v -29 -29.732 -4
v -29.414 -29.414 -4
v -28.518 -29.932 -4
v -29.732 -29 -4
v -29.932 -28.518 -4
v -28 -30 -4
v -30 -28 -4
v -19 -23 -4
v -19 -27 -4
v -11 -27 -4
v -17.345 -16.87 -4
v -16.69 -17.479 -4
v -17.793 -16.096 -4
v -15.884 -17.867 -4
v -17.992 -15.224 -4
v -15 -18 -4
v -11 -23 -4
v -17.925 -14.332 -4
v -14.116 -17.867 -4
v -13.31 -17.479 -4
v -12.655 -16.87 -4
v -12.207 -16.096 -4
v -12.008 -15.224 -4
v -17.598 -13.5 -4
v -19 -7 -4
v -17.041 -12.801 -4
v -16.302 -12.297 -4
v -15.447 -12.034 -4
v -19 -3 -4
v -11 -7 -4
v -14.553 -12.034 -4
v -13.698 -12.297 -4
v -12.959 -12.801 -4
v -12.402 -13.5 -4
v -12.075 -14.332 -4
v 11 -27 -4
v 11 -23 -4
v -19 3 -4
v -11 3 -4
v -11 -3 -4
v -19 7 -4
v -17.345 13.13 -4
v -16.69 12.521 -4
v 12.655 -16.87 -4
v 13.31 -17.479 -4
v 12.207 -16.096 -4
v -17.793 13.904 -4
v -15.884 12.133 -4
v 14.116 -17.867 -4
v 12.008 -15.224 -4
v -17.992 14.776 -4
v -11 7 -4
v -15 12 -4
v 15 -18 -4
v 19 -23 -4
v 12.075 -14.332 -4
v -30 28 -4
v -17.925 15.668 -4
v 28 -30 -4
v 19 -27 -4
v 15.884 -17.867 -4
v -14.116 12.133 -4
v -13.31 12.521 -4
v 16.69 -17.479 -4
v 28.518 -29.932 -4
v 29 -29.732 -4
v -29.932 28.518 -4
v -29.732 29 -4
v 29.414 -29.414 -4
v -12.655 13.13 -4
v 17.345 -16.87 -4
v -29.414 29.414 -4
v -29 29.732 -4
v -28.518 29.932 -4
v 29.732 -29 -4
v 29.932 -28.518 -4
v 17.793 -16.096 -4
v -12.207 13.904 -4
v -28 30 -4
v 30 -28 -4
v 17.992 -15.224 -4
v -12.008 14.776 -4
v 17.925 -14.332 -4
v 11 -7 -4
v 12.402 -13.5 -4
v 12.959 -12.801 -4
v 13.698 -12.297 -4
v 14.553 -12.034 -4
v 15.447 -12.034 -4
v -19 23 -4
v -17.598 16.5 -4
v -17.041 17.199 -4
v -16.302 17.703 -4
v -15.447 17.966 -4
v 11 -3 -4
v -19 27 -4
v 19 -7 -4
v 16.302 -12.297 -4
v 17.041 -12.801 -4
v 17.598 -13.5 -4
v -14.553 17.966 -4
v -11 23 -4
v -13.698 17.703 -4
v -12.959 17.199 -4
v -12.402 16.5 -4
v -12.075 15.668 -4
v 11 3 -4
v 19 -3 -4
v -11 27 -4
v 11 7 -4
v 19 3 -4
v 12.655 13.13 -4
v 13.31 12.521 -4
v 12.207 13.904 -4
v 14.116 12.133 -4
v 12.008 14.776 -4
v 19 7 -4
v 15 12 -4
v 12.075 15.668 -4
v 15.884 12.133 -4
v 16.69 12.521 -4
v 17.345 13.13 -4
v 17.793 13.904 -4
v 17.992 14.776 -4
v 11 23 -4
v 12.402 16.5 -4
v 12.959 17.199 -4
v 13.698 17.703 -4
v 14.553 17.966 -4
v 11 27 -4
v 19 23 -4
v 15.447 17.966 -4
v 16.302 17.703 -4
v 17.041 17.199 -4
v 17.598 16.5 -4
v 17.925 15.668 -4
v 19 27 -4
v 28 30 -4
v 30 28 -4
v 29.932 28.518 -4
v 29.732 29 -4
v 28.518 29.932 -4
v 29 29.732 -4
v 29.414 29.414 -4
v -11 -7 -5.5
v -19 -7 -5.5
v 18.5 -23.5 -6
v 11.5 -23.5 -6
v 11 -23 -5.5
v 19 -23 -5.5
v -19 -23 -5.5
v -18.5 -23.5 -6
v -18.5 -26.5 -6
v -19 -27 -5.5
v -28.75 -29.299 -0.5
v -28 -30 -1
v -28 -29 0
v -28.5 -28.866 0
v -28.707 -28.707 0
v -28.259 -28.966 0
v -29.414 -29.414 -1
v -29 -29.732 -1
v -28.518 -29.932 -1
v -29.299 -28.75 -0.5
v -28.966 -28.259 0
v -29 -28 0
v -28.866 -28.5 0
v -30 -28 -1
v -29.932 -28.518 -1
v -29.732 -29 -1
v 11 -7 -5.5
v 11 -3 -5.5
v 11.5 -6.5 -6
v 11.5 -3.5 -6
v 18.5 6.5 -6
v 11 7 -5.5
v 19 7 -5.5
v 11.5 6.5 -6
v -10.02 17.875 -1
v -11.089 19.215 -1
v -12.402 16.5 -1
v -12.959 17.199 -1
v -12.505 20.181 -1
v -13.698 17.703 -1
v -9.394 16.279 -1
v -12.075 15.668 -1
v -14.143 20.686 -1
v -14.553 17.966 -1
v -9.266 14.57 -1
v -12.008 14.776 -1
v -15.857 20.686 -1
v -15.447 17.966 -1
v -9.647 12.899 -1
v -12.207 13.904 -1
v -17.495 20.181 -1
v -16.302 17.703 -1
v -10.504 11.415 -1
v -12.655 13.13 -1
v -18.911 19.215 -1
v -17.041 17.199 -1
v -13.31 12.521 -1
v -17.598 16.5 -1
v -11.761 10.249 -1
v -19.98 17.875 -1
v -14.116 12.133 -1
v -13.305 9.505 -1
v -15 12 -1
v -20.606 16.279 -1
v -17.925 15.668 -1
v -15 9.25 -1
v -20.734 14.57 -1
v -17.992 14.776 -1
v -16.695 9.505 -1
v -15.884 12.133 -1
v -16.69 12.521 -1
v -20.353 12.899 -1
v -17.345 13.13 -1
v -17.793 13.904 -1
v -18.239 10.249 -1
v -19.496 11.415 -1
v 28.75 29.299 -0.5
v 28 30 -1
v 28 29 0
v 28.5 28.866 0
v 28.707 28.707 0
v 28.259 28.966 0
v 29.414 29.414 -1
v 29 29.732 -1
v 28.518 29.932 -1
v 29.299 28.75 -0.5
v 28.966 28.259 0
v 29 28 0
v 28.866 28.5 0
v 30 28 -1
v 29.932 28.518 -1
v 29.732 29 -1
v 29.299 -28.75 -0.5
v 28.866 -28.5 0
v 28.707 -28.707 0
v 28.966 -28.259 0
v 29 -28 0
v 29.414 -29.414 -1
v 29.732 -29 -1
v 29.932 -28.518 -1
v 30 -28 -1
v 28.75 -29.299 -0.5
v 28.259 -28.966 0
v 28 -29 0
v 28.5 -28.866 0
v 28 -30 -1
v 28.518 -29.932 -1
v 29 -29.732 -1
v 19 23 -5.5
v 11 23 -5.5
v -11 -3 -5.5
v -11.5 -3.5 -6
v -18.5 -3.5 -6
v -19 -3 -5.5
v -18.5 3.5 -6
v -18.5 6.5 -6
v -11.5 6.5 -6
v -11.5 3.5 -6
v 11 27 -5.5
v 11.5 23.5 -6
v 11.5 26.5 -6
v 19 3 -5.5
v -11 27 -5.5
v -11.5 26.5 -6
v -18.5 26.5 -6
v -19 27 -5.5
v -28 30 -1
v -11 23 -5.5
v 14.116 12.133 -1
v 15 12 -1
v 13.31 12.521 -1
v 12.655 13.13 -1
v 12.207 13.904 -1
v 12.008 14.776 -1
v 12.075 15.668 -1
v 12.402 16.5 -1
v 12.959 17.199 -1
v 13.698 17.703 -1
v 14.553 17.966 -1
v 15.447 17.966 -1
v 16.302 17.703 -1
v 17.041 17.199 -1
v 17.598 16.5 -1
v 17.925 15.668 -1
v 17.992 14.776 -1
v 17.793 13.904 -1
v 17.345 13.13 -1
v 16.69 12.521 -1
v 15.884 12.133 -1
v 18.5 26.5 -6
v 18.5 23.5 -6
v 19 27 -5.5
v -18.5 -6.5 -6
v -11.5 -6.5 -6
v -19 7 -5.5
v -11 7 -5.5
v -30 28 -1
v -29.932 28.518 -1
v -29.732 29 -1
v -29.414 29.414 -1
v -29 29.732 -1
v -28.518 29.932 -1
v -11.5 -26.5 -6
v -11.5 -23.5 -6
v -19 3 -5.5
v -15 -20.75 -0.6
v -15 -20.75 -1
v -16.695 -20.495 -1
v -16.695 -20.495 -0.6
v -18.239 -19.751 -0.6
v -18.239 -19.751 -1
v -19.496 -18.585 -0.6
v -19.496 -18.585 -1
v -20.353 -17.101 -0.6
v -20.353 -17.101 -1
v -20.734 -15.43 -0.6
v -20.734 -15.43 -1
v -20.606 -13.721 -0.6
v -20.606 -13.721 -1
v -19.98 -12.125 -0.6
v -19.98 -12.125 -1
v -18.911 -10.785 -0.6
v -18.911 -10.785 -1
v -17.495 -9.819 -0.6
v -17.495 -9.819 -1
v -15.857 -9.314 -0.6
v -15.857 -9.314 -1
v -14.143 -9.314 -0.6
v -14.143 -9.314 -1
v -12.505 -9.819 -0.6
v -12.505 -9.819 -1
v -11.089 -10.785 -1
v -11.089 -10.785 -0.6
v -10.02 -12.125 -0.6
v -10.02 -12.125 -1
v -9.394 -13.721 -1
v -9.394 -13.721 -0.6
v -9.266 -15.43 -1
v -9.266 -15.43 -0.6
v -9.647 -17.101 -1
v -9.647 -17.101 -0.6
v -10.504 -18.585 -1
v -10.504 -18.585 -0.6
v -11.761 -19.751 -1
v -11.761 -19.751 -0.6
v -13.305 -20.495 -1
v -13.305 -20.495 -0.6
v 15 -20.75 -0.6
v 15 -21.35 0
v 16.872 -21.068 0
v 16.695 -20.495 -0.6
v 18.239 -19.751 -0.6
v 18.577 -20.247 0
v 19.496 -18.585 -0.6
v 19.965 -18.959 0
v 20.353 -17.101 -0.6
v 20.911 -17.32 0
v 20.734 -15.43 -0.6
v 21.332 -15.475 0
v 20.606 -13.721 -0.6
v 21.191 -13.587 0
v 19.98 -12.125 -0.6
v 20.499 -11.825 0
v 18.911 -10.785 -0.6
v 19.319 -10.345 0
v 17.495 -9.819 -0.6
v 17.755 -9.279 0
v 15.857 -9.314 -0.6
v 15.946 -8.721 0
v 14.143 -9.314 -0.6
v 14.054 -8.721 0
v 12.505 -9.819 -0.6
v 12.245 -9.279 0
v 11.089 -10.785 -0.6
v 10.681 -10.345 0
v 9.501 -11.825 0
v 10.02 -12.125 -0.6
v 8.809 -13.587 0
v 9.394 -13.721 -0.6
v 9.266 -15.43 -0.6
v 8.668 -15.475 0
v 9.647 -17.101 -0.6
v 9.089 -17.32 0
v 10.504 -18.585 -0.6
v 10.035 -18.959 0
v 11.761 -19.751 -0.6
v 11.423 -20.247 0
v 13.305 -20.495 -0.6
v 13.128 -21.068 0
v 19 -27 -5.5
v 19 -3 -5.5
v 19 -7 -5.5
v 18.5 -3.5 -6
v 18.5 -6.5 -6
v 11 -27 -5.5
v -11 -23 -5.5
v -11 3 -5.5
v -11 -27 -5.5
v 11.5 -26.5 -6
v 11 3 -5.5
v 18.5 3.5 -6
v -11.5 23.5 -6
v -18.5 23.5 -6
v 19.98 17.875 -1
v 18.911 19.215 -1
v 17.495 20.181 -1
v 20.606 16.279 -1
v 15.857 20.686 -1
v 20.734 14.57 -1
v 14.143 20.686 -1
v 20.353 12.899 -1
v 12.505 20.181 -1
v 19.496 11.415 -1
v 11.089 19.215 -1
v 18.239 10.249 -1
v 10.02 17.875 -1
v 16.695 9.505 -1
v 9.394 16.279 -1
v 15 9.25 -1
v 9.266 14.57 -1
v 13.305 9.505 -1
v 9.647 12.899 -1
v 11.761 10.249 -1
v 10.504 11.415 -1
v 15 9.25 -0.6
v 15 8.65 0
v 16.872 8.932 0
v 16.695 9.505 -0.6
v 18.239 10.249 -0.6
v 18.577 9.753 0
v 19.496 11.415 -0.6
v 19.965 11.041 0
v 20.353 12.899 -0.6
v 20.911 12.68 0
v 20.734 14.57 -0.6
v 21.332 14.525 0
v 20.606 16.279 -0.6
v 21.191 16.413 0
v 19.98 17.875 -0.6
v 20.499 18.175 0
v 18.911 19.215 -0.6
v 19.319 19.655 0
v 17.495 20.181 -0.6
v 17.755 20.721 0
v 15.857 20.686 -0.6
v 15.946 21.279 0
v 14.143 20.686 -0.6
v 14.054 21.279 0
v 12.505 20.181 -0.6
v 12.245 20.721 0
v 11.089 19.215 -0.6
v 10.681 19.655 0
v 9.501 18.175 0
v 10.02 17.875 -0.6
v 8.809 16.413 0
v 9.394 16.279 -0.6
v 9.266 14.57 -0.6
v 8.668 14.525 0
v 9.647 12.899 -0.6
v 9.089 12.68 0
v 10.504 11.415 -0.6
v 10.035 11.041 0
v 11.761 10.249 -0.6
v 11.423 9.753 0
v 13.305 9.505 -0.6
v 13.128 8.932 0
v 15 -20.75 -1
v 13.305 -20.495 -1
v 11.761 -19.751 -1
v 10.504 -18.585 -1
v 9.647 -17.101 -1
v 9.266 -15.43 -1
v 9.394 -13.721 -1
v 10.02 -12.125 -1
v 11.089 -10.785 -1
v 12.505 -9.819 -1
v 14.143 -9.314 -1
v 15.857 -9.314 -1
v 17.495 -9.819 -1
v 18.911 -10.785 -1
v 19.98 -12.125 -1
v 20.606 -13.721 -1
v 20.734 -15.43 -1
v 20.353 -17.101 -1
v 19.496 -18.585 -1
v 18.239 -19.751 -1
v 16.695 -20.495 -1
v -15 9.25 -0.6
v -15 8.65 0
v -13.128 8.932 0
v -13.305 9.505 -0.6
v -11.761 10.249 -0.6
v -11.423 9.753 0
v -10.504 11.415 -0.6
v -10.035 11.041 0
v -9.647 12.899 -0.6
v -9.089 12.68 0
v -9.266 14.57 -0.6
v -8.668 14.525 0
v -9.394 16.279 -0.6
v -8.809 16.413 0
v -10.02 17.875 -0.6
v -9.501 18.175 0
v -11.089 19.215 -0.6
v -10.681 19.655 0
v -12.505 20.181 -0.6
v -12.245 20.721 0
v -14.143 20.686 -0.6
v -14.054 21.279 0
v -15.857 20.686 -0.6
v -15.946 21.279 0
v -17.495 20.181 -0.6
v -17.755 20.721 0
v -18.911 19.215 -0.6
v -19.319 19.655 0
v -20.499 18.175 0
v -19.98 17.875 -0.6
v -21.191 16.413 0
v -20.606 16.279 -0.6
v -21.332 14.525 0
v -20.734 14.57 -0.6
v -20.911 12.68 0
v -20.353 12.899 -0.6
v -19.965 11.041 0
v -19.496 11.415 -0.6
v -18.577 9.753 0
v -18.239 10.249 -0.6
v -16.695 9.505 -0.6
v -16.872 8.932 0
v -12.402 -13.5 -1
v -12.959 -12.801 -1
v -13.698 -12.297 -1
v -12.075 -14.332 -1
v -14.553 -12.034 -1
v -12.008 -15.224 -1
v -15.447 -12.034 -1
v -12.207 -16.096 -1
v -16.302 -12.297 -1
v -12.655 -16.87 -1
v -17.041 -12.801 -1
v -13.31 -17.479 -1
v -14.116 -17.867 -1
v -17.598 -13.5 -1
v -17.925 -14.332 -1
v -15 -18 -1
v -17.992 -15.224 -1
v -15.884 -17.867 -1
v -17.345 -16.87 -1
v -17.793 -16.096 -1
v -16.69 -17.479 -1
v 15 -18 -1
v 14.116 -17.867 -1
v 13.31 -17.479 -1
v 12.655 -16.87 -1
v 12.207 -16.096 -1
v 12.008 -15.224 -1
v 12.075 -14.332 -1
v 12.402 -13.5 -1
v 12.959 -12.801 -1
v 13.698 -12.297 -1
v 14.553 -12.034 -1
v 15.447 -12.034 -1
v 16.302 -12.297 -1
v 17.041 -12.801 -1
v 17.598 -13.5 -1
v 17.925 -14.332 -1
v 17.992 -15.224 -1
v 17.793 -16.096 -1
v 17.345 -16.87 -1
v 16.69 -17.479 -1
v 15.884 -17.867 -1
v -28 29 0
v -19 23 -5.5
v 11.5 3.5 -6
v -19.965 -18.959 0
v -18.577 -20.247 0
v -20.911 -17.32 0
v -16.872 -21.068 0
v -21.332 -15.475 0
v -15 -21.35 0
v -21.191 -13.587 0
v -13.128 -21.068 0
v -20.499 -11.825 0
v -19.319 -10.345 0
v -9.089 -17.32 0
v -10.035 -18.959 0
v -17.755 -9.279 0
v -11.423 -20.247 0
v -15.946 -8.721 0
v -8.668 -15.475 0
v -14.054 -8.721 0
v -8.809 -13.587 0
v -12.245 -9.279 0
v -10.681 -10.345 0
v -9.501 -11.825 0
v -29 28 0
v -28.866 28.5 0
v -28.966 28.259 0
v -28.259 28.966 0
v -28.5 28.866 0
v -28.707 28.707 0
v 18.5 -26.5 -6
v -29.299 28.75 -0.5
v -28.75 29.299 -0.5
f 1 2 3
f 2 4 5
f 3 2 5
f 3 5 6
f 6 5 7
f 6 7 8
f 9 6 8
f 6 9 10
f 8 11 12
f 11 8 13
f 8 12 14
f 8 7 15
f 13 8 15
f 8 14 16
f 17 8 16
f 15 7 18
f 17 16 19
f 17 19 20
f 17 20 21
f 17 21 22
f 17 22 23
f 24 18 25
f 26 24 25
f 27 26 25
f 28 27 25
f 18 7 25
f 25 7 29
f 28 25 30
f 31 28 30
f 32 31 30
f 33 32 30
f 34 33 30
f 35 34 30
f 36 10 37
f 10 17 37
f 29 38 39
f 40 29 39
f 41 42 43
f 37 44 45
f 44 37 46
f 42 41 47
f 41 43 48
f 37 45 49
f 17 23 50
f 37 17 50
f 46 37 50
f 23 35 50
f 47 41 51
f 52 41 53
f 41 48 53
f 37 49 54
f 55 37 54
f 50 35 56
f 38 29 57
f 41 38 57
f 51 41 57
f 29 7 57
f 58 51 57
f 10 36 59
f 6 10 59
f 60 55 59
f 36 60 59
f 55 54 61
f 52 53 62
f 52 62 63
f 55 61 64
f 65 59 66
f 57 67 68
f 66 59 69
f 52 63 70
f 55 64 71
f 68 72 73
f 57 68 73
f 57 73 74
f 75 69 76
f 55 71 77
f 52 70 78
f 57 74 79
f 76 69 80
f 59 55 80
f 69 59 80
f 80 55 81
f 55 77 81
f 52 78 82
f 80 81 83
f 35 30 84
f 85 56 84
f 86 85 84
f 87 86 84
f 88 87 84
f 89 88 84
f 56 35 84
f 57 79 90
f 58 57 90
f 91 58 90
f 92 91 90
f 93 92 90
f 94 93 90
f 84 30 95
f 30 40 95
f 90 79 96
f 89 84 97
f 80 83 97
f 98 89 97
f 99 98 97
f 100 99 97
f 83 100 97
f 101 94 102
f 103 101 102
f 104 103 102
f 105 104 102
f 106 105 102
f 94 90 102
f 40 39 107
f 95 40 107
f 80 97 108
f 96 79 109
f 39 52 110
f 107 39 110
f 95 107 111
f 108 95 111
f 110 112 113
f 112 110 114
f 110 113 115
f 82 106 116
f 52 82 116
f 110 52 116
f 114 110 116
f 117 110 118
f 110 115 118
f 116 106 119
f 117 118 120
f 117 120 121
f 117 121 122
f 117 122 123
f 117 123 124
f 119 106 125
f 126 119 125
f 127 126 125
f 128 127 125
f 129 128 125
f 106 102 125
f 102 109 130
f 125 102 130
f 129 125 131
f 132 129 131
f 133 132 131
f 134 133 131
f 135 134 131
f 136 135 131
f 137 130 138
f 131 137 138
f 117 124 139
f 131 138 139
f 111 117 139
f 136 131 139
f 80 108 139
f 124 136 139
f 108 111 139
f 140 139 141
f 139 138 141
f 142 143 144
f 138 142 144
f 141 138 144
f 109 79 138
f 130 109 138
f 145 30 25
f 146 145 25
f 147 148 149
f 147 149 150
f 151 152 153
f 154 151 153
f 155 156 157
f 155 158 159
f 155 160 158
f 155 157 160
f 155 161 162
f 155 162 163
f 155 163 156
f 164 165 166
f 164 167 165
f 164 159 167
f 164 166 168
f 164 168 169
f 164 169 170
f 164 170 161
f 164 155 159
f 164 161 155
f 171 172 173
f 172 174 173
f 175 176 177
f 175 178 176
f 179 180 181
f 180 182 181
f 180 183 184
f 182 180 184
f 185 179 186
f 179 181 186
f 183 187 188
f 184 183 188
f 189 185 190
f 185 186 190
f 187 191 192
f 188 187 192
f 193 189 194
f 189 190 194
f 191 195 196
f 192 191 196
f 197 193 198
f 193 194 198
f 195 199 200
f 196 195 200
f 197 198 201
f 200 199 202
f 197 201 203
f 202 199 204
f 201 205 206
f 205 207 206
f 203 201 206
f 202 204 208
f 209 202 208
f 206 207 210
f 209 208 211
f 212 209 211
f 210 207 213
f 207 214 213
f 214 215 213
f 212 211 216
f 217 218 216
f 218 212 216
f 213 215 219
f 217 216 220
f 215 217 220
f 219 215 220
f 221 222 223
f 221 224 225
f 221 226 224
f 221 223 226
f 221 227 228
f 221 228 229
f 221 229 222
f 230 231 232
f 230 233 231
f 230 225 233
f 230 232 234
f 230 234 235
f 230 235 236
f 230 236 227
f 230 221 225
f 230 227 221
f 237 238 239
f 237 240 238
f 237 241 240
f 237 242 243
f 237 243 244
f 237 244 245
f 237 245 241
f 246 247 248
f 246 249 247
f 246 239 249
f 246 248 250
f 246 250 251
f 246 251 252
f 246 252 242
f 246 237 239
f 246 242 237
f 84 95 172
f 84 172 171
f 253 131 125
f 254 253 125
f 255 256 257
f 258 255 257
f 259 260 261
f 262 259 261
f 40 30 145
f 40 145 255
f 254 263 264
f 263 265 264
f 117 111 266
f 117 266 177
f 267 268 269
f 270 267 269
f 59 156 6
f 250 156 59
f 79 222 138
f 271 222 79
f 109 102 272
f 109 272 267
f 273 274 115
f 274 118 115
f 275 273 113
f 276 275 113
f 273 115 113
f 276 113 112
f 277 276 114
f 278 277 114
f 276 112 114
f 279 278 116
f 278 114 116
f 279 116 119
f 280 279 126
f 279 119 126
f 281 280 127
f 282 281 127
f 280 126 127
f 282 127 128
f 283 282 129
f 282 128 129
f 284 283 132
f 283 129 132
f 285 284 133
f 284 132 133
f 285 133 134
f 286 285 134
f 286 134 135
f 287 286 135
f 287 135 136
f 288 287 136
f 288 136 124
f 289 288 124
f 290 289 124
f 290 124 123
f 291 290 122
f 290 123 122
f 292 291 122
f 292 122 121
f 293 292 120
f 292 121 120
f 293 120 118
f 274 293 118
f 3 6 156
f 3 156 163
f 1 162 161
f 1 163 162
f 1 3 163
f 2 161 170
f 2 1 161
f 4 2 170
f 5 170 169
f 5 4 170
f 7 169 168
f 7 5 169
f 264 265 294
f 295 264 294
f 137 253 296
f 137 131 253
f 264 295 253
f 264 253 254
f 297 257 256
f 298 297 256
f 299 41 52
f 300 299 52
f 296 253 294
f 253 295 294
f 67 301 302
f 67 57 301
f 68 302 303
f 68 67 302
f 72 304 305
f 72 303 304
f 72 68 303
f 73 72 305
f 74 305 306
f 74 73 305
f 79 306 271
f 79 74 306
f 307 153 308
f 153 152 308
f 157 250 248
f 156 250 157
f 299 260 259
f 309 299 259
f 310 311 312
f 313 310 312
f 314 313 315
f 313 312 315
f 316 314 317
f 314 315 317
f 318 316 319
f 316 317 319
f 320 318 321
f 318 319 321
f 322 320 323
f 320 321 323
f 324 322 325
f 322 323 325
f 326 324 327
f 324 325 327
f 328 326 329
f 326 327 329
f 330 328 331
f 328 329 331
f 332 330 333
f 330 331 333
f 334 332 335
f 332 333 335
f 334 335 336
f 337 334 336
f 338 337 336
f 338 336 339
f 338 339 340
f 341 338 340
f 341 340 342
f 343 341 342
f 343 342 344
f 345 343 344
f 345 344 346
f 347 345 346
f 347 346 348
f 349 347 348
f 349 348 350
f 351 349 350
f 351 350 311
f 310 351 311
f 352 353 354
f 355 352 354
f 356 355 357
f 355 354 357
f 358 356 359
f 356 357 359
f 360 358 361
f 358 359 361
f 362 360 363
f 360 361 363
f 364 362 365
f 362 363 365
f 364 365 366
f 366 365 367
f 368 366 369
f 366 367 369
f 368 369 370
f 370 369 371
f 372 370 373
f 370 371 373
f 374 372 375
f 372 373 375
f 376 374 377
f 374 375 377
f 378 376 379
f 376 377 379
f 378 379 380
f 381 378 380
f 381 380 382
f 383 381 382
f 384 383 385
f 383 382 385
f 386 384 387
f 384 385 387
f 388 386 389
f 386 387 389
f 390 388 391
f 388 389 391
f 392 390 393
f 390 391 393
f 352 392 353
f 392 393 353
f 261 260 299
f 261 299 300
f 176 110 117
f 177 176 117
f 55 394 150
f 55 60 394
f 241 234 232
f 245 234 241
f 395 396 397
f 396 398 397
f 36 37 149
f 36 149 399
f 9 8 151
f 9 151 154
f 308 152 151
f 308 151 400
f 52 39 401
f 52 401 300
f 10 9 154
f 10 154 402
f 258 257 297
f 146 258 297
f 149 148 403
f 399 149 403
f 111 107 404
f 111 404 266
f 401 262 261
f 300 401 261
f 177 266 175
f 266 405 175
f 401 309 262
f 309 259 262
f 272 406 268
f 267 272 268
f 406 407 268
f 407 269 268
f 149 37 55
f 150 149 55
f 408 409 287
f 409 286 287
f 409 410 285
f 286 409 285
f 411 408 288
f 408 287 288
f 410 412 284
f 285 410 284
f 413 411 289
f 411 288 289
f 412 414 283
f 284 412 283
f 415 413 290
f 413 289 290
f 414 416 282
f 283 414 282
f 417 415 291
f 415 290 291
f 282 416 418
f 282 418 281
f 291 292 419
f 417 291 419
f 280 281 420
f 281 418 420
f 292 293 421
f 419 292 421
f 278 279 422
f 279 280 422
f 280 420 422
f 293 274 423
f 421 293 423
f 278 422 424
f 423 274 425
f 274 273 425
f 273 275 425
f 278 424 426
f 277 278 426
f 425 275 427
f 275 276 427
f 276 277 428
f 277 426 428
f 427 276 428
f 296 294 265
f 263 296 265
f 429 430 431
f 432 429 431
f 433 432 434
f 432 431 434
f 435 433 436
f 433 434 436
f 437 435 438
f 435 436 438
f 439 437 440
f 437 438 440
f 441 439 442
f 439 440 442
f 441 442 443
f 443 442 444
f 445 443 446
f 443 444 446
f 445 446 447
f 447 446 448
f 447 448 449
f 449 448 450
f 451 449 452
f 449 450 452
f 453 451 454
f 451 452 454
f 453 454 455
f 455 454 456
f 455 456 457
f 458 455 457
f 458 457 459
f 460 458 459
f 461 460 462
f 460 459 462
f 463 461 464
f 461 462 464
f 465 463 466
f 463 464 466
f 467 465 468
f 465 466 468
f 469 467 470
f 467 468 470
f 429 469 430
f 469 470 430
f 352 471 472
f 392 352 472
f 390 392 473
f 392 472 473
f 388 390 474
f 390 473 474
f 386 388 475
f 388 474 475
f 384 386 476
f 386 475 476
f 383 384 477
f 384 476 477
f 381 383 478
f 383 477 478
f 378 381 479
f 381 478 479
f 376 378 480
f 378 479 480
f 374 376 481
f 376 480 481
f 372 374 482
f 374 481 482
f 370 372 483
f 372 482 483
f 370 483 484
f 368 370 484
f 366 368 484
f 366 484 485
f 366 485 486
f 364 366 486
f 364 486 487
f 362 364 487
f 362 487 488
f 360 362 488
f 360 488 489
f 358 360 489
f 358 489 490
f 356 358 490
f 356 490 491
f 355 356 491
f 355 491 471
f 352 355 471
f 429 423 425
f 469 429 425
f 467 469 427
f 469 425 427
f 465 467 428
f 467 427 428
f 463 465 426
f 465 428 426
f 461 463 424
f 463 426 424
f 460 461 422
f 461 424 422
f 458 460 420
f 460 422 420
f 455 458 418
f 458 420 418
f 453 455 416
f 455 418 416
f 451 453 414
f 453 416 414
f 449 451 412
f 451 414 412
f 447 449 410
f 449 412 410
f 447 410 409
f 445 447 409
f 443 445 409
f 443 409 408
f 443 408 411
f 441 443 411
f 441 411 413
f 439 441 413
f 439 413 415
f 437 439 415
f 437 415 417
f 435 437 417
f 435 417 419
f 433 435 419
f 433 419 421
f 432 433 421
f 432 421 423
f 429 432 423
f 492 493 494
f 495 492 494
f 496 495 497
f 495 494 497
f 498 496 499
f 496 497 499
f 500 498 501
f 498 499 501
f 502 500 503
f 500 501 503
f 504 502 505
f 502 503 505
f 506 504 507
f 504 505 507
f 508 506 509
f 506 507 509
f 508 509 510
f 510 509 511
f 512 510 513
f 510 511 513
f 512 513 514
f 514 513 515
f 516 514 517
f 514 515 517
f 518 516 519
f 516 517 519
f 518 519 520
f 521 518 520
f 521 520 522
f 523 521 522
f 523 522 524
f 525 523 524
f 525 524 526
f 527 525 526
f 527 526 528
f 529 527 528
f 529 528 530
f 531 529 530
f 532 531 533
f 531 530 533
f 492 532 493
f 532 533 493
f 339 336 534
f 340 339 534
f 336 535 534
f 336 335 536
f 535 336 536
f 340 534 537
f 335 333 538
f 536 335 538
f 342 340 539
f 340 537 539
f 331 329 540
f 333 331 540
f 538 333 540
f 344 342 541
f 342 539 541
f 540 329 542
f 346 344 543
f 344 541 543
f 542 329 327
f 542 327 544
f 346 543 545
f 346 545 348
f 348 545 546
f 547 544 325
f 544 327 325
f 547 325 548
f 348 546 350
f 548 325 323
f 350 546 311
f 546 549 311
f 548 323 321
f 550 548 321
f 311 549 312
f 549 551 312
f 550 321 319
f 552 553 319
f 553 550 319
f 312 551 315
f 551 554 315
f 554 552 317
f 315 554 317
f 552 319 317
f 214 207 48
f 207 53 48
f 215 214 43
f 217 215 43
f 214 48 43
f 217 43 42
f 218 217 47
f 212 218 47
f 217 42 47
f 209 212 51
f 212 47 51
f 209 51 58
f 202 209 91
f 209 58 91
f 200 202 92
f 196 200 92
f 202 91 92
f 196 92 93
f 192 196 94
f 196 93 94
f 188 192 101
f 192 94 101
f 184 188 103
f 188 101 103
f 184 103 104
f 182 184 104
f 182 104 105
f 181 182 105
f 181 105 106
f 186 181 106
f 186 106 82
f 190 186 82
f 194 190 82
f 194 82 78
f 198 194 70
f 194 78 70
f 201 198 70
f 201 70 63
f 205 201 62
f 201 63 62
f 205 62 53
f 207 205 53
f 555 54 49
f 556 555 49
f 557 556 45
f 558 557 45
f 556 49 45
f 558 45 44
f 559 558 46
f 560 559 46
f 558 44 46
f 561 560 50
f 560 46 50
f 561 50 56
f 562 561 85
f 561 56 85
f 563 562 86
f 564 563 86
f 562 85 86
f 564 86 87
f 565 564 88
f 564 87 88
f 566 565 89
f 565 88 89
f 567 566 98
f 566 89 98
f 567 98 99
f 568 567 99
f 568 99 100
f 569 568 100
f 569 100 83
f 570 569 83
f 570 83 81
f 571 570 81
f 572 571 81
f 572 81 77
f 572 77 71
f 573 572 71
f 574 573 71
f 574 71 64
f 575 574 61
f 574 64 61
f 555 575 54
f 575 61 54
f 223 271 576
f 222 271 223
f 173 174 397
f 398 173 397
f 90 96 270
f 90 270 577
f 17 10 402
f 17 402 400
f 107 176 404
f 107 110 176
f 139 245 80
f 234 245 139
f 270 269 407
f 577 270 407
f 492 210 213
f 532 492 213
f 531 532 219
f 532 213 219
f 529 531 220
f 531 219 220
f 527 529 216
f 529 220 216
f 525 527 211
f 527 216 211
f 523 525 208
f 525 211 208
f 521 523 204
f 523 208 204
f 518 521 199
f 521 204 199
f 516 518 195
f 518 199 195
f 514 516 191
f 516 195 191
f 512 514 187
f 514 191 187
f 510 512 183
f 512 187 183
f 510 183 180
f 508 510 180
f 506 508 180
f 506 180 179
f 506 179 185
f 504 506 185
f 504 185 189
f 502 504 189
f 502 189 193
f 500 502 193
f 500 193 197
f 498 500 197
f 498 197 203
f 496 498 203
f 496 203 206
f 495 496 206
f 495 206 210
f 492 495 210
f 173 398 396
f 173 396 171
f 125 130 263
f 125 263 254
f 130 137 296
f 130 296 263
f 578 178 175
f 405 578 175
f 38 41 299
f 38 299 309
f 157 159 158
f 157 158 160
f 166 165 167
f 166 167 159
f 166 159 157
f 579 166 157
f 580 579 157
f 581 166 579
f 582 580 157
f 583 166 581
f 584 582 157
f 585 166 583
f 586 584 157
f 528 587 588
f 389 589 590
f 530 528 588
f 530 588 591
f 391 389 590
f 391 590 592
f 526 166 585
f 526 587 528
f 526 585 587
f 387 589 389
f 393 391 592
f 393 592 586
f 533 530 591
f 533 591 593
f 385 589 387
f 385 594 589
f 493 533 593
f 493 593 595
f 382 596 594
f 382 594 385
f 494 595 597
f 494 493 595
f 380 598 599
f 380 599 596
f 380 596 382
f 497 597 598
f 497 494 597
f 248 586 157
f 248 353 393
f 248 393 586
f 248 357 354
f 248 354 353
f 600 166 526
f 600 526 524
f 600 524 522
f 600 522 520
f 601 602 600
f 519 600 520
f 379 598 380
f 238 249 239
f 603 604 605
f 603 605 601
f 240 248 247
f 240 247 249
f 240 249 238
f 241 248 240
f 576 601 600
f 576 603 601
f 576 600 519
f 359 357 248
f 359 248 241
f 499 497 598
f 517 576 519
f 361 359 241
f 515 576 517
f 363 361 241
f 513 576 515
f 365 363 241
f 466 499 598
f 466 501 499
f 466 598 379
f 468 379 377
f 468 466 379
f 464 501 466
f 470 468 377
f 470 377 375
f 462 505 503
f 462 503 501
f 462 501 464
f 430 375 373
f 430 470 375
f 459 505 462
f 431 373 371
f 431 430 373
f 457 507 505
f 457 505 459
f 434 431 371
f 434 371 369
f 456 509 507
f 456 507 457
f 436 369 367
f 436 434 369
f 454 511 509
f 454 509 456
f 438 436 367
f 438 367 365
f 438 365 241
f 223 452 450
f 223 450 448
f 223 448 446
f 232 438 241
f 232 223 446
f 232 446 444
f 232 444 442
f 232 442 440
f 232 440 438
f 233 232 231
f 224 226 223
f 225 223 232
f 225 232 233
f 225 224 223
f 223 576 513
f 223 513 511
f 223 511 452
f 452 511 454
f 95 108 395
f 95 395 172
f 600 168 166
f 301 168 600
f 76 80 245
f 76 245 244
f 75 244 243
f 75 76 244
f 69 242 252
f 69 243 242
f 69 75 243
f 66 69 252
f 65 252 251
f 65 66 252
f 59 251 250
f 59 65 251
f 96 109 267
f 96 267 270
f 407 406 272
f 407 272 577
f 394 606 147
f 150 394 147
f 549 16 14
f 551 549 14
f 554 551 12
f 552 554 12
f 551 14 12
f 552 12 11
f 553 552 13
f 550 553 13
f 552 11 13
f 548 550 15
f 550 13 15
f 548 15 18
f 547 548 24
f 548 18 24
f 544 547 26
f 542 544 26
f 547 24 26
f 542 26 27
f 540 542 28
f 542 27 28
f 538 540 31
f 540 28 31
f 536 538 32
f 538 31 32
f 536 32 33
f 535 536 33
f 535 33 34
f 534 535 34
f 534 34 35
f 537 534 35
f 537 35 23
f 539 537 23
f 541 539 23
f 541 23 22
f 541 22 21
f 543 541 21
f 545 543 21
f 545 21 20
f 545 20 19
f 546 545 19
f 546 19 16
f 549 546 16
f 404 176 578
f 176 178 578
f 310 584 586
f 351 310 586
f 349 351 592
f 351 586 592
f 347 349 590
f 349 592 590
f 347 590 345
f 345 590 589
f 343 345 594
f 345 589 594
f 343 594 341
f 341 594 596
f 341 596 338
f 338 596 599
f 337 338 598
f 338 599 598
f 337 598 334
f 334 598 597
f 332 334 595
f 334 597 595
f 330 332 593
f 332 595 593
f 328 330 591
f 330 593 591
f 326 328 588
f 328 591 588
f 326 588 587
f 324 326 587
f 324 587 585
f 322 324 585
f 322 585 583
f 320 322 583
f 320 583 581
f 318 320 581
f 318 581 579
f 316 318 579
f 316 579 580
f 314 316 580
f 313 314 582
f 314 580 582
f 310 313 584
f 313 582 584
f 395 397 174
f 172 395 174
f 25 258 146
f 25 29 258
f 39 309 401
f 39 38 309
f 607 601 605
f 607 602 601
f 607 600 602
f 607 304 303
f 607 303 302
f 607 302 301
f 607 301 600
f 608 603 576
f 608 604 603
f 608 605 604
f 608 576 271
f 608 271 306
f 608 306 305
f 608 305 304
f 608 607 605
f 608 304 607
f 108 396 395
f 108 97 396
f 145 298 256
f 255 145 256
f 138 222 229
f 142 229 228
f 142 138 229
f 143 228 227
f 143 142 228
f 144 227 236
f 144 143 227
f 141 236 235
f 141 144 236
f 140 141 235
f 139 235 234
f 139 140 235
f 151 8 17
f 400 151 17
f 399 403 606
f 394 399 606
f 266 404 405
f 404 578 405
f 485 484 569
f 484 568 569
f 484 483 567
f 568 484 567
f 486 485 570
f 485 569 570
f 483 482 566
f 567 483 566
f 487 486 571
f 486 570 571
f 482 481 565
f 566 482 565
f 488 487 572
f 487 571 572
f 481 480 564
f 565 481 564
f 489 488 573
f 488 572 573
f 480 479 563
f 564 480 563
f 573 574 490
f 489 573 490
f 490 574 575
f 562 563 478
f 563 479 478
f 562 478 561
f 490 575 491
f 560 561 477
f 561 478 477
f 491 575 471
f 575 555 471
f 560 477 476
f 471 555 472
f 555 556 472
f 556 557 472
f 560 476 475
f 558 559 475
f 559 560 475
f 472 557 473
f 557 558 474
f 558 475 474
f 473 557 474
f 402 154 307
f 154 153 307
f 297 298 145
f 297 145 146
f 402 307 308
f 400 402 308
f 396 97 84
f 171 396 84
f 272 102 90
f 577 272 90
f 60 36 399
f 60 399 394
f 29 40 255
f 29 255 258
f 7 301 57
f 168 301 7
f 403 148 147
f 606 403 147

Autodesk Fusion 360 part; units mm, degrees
sketch "Sketch1" plane through (0, 0, 0) normal (0, 0, 1) x (1, 0, 0)
  line L0 (30, 30) -> (-30, 30)
  line L1 (-30, 30) -> (-30, -30)
  line L2 (-30, -30) -> (30, -30)
  line L3 (30, -30) -> (30, 30)
  line L4 (30, 30) -> (-30, -30) construction
  line L5 (-30, 30) -> (30, -30) construction
  line L6 (-30, -30) -> (-15, -30) construction
  line L7 (-15, -30) -> (-15, -15) construction
  line L8 (-15, -15) -> (-30, -15) construction
  line L9 (-30, -15) -> (-30, -30) construction
  line L10 (-11, -3) -> (-19, -3)
  line L11 (-19, -3) -> (-19, -27)
  line L12 (-19, -27) -> (-11, -27)
  line L13 (-11, -27) -> (-11, -3)
  line L14 (-11, -3) -> (-19, -27) construction
  line L15 (-19, -3) -> (-11, -27) construction
  line L16 (-11, -7) -> (-19, -7)
  line L17 (-19, -7) -> (-19, -23)
  line L18 (-19, -23) -> (-11, -23)
  line L19 (-11, -23) -> (-11, -7)
  line L20 (-11, -7) -> (-19, -23) construction
  line L21 (-19, -7) -> (-11, -23) construction
  point P0 (-15, -15)
  point P1 (-15, -15)
  point P2 (-15, -15)
  dimension "d1" = 60
  dimension "d2" = 60
  dimension "d25" = 15
  dimension "d26" = 15
  dimension "d38" = 8
  dimension "d39" = 24
  dimension "d40" = 8
  dimension "d41" = 16
extrude "Extrude1" add sketch "Sketch1" against normal blind 4 contours L0 L1 L2 L3 | L10 L11 L13 L16 | L11 L13 L16 L17 L18 L19 | L11 L12 L13 L18 in component "body"
hole "Hole2" at (-15, -15, 0) direction (0, 0, -1) diameter 6 depth 4 tip angle 118 counterbore diameter 11.5 counterbore depth 1 in component "body"
extrude "Extrude2" add sketch "Sketch1" against normal blind 2 from surface at -4 contours L10 L11 L13 L16 | L11 L12 L13 L18 in component "body"
chamfer "Chamfer4" distance 0.5 angle 45 2 faces at (-16.3333, -25.6667, -6) (-16.3333, -4.3333, -6) in component "body"
chamfer "Chamfer4" distance 0.6 angle 45 1 edges at (-20.3609, -12.9207, 0) in component "body"
pattern_linear "R-Pattern2" count 2 spacing 30 along (0, 1, 0) count 2 spacing 30 along (1, 0, 0) of "Hole2", "Extrude2", "Chamfer4" in component "body"
fillet "Fillet1" radius 2 4 edges at (-30, -30, -2) (30, -30, -2) (30, 30, -2) (-30, 30, -2) in component "body"
chamfer "Chamfer1" distance 1 distance2 1 8 edges at (0, -30, 0) (29.4142, -29.4142, 0) (30, 0, 0) (29.4142, 29.4142, 0) (0, 30, 0) (-29.4142, 29.4142, 0) (-30, 0, 0) (-29.4142, -29.4142, 0) measured on face at (-3.5603, 3.4484, 0) measured on face at (28.0952, -29.9977, -1.3333) measured on face at (-3.5603, 3.4484, 0) measured on face at (28.0952, 29.9977, -1.3333) measured on face at (-3.5603, 3.4484, 0) measured on face at (-29.9977, 28.0952, -1.3333) measured on face at (-3.5603, 3.4484, 0) measured on face at (-29.9977, -28.0952, -1.3333) in component "body"
component "body" placed x (1, 0, 0) y (0, 1, 0) z (0, 0, 1) at (0, 0, 0)
equation "d2 = unitY * size"
equation "size = 30 mm"
equation "unitX = 2"
equation "unitY = 2"
equation "d21 = unitY"
equation "d22 = unitX"
equation "d23 = size"
equation "d24 = -size"
equation "d25 = size / 2"
equation "d26 = size / 2"
